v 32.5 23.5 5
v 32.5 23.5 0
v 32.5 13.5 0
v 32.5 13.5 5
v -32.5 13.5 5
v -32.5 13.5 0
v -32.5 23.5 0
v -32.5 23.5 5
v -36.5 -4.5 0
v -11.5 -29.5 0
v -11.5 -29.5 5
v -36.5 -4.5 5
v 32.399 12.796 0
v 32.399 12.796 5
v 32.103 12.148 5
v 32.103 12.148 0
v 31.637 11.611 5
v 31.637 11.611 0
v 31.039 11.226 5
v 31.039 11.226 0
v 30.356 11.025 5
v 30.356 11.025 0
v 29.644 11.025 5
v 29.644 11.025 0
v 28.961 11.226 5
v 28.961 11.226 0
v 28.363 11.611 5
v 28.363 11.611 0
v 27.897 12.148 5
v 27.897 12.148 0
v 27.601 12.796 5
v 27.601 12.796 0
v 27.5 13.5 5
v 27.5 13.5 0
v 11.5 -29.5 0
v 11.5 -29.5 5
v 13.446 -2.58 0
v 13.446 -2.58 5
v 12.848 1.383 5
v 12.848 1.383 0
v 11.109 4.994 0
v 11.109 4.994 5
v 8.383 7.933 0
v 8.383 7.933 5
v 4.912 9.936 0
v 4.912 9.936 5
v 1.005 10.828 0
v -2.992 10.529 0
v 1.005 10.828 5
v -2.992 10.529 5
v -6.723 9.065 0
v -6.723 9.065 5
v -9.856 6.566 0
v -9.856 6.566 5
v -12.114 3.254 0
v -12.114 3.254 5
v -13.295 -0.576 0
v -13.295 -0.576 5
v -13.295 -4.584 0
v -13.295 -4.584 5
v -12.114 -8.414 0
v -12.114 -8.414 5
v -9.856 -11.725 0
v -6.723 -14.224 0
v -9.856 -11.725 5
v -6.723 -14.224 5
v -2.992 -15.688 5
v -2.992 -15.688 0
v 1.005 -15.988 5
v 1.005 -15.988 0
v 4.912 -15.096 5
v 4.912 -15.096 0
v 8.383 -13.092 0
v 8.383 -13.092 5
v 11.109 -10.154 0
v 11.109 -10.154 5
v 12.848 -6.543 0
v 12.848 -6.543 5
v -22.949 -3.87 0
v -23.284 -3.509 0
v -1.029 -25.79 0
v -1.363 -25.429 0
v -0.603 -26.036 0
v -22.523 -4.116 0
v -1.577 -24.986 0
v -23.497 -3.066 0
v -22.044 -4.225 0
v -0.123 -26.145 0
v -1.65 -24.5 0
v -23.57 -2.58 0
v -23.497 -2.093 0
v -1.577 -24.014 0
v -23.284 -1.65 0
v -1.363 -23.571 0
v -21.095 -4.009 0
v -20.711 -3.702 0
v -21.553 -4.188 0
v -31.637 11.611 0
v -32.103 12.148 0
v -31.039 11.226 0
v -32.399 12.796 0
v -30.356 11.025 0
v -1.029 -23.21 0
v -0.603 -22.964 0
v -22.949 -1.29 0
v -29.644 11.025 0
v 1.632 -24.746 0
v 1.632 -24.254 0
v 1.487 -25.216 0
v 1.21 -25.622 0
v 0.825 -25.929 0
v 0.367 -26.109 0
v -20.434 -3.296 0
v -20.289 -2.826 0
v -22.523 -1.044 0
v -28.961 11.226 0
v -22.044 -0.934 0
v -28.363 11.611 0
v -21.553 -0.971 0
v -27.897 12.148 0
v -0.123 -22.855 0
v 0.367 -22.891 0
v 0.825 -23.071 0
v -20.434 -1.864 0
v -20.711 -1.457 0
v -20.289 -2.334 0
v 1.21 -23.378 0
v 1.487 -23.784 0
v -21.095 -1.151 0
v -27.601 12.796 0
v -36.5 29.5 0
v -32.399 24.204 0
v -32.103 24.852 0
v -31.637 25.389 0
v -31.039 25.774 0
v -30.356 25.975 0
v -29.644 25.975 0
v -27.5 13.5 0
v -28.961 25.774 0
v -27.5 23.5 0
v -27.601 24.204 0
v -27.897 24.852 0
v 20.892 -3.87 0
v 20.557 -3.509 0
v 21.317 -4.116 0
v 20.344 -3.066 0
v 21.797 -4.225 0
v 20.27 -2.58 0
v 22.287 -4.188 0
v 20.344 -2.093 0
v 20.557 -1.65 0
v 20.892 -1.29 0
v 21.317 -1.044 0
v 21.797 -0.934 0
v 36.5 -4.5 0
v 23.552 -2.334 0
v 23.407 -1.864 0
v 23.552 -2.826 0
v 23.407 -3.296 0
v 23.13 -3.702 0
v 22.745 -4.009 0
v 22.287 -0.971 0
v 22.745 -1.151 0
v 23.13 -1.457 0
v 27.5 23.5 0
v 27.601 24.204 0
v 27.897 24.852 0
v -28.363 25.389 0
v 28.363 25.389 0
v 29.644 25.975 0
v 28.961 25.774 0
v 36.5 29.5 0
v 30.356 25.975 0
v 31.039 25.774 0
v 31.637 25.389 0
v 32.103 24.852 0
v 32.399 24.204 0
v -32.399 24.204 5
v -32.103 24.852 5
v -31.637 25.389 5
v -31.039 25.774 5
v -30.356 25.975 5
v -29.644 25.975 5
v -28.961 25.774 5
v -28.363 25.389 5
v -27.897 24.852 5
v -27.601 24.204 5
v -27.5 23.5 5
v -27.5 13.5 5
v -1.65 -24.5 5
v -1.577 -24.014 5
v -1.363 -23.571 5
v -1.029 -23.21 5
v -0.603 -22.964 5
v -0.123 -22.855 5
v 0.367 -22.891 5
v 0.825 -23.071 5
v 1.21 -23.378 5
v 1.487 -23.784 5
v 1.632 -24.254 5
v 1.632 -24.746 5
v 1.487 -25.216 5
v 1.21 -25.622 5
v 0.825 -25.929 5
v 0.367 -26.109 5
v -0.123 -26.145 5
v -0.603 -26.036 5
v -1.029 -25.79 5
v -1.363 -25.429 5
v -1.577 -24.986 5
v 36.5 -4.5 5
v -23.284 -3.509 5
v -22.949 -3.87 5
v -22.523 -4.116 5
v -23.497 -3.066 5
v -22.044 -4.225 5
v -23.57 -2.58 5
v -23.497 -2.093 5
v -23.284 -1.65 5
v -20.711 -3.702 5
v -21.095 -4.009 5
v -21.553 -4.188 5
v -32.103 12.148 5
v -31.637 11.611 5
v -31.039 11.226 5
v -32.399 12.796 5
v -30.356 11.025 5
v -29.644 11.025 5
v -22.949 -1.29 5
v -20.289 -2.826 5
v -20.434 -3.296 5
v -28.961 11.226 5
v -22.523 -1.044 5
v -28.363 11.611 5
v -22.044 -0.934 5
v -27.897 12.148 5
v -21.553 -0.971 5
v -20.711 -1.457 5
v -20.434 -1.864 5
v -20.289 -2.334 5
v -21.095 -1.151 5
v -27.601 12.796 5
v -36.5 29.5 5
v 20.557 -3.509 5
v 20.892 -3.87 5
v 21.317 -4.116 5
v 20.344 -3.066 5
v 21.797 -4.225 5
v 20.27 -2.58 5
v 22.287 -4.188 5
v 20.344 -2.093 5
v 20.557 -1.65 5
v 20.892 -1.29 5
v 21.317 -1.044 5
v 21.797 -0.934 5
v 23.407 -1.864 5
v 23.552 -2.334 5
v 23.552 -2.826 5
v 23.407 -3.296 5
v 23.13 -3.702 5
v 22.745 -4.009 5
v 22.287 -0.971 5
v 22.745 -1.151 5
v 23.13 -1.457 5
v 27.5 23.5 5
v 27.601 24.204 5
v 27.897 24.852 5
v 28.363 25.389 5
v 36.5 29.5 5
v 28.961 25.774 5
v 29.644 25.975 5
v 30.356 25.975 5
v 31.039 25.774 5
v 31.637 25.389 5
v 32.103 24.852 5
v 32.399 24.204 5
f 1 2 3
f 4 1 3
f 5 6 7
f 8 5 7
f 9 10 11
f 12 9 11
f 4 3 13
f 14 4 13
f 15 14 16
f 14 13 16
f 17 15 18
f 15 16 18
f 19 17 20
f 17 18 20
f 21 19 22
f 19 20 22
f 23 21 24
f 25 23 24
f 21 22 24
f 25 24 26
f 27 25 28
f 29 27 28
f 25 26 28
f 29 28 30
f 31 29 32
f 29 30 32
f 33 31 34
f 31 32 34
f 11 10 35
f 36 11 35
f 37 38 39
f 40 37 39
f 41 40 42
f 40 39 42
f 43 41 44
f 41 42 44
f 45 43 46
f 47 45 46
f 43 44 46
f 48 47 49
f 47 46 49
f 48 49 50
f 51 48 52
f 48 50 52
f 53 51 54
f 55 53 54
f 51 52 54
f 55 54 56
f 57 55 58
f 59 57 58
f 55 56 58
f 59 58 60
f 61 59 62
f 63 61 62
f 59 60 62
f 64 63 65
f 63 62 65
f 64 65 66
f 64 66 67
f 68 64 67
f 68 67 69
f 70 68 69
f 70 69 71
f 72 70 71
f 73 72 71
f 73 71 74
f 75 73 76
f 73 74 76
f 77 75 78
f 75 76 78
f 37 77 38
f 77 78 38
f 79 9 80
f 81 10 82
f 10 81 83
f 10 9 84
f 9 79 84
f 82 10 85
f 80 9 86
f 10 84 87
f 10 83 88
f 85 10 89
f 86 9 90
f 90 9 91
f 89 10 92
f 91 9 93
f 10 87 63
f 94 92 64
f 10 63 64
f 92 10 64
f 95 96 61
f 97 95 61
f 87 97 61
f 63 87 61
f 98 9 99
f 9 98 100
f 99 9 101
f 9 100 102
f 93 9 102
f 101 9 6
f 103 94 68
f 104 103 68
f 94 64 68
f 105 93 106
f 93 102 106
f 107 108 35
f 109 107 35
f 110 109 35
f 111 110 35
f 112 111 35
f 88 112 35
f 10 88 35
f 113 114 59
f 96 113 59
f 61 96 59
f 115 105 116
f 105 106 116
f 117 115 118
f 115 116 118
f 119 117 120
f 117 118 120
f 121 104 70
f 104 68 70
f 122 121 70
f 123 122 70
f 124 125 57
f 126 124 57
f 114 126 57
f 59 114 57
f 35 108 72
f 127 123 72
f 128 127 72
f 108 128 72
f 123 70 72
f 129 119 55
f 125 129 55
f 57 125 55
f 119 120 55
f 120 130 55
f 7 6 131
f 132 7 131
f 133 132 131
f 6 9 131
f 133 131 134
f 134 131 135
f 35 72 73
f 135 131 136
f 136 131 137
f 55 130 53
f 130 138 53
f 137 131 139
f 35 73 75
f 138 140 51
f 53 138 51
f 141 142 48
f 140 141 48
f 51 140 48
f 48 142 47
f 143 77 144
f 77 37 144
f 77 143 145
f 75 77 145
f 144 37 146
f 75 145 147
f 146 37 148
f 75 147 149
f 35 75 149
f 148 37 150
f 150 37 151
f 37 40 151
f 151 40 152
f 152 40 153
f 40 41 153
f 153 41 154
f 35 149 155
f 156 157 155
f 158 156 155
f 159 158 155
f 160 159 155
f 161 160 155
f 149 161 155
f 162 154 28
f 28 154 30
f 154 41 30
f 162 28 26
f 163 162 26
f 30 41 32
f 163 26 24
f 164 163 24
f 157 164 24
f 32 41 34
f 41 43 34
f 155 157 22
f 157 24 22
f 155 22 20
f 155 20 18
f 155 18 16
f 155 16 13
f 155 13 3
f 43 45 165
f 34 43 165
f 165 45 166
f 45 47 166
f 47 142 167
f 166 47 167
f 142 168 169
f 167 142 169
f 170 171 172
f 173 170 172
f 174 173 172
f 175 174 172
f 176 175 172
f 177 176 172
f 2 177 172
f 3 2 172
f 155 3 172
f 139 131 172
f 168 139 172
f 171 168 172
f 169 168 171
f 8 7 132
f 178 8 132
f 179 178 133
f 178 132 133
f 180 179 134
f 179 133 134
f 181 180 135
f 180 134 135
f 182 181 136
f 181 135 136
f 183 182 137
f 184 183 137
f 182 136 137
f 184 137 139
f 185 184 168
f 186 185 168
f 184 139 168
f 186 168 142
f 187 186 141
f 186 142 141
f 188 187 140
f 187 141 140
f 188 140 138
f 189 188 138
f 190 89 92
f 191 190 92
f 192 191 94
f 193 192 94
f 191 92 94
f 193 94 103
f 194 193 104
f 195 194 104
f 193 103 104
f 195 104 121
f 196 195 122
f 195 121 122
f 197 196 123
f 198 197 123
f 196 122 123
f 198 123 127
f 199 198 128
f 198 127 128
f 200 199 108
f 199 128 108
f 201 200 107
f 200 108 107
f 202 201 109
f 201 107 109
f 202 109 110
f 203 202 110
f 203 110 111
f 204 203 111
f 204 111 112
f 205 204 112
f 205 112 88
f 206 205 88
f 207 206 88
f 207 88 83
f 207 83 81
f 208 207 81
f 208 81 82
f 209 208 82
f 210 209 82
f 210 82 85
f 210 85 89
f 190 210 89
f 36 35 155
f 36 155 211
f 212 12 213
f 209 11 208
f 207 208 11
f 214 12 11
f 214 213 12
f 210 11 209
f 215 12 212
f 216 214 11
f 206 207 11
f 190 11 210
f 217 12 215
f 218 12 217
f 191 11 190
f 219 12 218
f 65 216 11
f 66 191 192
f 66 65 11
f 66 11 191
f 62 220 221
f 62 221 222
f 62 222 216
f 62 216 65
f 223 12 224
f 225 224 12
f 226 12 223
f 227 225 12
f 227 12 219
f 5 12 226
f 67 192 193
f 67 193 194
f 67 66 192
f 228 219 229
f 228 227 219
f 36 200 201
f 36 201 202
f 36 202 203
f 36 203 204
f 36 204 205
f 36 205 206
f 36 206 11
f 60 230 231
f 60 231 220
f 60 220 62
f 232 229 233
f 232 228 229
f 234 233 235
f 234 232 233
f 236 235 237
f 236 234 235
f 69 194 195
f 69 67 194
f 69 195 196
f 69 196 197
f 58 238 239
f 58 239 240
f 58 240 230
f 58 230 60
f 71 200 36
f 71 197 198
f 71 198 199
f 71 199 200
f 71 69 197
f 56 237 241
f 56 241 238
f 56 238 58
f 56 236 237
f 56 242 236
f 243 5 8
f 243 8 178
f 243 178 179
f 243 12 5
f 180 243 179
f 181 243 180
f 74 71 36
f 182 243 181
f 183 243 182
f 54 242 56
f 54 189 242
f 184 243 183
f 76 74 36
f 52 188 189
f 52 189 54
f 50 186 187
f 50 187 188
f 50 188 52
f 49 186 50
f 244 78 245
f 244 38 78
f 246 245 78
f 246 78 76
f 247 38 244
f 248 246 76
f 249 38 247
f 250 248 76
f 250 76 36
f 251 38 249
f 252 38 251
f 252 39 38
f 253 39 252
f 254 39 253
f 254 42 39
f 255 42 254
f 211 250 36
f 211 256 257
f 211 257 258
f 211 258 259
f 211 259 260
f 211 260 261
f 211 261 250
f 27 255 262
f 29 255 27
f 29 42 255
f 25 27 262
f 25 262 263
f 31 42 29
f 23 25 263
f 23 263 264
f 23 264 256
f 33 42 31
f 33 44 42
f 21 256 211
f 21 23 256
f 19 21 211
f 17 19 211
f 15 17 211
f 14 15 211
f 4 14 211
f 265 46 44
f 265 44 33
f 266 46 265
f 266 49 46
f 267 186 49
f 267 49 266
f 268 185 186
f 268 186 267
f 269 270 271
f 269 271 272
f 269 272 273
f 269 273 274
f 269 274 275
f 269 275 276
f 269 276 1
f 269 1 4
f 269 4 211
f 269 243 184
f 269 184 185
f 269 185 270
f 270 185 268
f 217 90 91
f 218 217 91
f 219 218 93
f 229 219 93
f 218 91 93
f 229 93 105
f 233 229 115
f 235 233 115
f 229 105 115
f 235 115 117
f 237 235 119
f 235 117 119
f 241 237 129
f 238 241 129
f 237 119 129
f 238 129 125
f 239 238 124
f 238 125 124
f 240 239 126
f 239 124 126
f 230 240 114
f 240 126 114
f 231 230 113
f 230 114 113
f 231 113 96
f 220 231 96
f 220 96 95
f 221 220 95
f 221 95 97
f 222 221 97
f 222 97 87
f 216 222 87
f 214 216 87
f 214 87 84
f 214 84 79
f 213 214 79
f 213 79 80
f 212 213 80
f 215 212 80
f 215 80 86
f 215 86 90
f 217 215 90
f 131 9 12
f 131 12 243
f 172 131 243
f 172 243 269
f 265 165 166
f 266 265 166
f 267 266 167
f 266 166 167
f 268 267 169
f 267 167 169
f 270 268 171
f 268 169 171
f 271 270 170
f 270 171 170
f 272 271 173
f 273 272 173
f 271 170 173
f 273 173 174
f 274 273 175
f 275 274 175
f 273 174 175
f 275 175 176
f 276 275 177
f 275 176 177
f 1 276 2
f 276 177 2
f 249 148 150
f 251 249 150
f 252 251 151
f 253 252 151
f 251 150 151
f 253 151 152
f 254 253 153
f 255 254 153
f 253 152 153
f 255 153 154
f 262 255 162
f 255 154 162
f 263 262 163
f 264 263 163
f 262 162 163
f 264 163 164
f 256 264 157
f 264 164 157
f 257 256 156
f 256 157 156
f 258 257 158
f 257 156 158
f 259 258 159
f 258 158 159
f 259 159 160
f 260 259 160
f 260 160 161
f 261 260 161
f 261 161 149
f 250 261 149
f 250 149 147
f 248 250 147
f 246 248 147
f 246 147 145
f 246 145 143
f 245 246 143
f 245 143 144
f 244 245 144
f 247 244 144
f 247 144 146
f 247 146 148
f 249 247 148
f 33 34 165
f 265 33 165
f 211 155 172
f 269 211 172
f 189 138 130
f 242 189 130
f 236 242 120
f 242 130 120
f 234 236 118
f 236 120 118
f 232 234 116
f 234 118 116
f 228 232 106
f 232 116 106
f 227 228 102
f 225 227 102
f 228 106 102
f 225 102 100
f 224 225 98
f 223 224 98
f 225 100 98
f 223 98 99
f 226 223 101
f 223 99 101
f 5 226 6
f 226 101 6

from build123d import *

# Parameters (mm, degrees)
F0_W     = 73
F0_H     = 59
F1_DEPTH = 5
F2_SIZE  = 25
F4_D     = 3.3
F4_DEPTH = 13.8
F4_TIP   = 0.9914200214
F3_R     = 13.4455987062
F5_DEPTH = 5


with BuildPart() as f1:
    # F0 (on Top) → F1 (new body)
    with BuildSketch(Plane.XY):
        Rectangle(F0_W, F0_H)
        with BuildLine():
            Line((-32.5, 13.5), (-32.5, 23.5))
            ThreePointArc((-32.5, 23.5), (-30, 26), (-27.5, 23.5))
            Line((-27.5, 23.5), (-27.5, 13.5))
            ThreePointArc((-27.5, 13.5), (-30, 11), (-32.5, 13.5))
        make_face(mode=Mode.SUBTRACT)
        with BuildLine():
            Line((27.5, 13.5), (27.5, 23.5))
            ThreePointArc((27.5, 23.5), (30, 26), (32.5, 23.5))
            Line((32.5, 23.5), (32.5, 13.5))
            ThreePointArc((32.5, 13.5), (30, 11), (27.5, 13.5))
        make_face(mode=Mode.SUBTRACT)
    extrude(amount=F1_DEPTH)

    # F2
    f2_edges = [f1.edges().sort_by_distance(p)[0] for p in [
        (-36.5, -29.5, 2.5),
        (36.5, -29.5, 2.5),
    ]]
    chamfer(f2_edges, length=F2_SIZE)

    # F4
    with Locations(Plane.XY.offset(5)):
        with Locations((-21.9203102168, -2.5796897832), (0, -24.5), (21.9203102168, -2.5796897832)):
            Hole(F4_D / 2, depth=F4_DEPTH)
            with Locations((0, 0, -(F4_DEPTH + F4_TIP / 2))):  # 118° drill point
                Cone(0, F4_D / 2, F4_TIP, mode=Mode.SUBTRACT)

    # F3 (on face) → F5 (cut, through all)
    with BuildSketch(Plane.XY.offset(5)):
        with Locations((0, -2.5796897832)):
            Circle(F3_R)
    extrude(amount=-F5_DEPTH, mode=Mode.SUBTRACT)


solid = f1.part
